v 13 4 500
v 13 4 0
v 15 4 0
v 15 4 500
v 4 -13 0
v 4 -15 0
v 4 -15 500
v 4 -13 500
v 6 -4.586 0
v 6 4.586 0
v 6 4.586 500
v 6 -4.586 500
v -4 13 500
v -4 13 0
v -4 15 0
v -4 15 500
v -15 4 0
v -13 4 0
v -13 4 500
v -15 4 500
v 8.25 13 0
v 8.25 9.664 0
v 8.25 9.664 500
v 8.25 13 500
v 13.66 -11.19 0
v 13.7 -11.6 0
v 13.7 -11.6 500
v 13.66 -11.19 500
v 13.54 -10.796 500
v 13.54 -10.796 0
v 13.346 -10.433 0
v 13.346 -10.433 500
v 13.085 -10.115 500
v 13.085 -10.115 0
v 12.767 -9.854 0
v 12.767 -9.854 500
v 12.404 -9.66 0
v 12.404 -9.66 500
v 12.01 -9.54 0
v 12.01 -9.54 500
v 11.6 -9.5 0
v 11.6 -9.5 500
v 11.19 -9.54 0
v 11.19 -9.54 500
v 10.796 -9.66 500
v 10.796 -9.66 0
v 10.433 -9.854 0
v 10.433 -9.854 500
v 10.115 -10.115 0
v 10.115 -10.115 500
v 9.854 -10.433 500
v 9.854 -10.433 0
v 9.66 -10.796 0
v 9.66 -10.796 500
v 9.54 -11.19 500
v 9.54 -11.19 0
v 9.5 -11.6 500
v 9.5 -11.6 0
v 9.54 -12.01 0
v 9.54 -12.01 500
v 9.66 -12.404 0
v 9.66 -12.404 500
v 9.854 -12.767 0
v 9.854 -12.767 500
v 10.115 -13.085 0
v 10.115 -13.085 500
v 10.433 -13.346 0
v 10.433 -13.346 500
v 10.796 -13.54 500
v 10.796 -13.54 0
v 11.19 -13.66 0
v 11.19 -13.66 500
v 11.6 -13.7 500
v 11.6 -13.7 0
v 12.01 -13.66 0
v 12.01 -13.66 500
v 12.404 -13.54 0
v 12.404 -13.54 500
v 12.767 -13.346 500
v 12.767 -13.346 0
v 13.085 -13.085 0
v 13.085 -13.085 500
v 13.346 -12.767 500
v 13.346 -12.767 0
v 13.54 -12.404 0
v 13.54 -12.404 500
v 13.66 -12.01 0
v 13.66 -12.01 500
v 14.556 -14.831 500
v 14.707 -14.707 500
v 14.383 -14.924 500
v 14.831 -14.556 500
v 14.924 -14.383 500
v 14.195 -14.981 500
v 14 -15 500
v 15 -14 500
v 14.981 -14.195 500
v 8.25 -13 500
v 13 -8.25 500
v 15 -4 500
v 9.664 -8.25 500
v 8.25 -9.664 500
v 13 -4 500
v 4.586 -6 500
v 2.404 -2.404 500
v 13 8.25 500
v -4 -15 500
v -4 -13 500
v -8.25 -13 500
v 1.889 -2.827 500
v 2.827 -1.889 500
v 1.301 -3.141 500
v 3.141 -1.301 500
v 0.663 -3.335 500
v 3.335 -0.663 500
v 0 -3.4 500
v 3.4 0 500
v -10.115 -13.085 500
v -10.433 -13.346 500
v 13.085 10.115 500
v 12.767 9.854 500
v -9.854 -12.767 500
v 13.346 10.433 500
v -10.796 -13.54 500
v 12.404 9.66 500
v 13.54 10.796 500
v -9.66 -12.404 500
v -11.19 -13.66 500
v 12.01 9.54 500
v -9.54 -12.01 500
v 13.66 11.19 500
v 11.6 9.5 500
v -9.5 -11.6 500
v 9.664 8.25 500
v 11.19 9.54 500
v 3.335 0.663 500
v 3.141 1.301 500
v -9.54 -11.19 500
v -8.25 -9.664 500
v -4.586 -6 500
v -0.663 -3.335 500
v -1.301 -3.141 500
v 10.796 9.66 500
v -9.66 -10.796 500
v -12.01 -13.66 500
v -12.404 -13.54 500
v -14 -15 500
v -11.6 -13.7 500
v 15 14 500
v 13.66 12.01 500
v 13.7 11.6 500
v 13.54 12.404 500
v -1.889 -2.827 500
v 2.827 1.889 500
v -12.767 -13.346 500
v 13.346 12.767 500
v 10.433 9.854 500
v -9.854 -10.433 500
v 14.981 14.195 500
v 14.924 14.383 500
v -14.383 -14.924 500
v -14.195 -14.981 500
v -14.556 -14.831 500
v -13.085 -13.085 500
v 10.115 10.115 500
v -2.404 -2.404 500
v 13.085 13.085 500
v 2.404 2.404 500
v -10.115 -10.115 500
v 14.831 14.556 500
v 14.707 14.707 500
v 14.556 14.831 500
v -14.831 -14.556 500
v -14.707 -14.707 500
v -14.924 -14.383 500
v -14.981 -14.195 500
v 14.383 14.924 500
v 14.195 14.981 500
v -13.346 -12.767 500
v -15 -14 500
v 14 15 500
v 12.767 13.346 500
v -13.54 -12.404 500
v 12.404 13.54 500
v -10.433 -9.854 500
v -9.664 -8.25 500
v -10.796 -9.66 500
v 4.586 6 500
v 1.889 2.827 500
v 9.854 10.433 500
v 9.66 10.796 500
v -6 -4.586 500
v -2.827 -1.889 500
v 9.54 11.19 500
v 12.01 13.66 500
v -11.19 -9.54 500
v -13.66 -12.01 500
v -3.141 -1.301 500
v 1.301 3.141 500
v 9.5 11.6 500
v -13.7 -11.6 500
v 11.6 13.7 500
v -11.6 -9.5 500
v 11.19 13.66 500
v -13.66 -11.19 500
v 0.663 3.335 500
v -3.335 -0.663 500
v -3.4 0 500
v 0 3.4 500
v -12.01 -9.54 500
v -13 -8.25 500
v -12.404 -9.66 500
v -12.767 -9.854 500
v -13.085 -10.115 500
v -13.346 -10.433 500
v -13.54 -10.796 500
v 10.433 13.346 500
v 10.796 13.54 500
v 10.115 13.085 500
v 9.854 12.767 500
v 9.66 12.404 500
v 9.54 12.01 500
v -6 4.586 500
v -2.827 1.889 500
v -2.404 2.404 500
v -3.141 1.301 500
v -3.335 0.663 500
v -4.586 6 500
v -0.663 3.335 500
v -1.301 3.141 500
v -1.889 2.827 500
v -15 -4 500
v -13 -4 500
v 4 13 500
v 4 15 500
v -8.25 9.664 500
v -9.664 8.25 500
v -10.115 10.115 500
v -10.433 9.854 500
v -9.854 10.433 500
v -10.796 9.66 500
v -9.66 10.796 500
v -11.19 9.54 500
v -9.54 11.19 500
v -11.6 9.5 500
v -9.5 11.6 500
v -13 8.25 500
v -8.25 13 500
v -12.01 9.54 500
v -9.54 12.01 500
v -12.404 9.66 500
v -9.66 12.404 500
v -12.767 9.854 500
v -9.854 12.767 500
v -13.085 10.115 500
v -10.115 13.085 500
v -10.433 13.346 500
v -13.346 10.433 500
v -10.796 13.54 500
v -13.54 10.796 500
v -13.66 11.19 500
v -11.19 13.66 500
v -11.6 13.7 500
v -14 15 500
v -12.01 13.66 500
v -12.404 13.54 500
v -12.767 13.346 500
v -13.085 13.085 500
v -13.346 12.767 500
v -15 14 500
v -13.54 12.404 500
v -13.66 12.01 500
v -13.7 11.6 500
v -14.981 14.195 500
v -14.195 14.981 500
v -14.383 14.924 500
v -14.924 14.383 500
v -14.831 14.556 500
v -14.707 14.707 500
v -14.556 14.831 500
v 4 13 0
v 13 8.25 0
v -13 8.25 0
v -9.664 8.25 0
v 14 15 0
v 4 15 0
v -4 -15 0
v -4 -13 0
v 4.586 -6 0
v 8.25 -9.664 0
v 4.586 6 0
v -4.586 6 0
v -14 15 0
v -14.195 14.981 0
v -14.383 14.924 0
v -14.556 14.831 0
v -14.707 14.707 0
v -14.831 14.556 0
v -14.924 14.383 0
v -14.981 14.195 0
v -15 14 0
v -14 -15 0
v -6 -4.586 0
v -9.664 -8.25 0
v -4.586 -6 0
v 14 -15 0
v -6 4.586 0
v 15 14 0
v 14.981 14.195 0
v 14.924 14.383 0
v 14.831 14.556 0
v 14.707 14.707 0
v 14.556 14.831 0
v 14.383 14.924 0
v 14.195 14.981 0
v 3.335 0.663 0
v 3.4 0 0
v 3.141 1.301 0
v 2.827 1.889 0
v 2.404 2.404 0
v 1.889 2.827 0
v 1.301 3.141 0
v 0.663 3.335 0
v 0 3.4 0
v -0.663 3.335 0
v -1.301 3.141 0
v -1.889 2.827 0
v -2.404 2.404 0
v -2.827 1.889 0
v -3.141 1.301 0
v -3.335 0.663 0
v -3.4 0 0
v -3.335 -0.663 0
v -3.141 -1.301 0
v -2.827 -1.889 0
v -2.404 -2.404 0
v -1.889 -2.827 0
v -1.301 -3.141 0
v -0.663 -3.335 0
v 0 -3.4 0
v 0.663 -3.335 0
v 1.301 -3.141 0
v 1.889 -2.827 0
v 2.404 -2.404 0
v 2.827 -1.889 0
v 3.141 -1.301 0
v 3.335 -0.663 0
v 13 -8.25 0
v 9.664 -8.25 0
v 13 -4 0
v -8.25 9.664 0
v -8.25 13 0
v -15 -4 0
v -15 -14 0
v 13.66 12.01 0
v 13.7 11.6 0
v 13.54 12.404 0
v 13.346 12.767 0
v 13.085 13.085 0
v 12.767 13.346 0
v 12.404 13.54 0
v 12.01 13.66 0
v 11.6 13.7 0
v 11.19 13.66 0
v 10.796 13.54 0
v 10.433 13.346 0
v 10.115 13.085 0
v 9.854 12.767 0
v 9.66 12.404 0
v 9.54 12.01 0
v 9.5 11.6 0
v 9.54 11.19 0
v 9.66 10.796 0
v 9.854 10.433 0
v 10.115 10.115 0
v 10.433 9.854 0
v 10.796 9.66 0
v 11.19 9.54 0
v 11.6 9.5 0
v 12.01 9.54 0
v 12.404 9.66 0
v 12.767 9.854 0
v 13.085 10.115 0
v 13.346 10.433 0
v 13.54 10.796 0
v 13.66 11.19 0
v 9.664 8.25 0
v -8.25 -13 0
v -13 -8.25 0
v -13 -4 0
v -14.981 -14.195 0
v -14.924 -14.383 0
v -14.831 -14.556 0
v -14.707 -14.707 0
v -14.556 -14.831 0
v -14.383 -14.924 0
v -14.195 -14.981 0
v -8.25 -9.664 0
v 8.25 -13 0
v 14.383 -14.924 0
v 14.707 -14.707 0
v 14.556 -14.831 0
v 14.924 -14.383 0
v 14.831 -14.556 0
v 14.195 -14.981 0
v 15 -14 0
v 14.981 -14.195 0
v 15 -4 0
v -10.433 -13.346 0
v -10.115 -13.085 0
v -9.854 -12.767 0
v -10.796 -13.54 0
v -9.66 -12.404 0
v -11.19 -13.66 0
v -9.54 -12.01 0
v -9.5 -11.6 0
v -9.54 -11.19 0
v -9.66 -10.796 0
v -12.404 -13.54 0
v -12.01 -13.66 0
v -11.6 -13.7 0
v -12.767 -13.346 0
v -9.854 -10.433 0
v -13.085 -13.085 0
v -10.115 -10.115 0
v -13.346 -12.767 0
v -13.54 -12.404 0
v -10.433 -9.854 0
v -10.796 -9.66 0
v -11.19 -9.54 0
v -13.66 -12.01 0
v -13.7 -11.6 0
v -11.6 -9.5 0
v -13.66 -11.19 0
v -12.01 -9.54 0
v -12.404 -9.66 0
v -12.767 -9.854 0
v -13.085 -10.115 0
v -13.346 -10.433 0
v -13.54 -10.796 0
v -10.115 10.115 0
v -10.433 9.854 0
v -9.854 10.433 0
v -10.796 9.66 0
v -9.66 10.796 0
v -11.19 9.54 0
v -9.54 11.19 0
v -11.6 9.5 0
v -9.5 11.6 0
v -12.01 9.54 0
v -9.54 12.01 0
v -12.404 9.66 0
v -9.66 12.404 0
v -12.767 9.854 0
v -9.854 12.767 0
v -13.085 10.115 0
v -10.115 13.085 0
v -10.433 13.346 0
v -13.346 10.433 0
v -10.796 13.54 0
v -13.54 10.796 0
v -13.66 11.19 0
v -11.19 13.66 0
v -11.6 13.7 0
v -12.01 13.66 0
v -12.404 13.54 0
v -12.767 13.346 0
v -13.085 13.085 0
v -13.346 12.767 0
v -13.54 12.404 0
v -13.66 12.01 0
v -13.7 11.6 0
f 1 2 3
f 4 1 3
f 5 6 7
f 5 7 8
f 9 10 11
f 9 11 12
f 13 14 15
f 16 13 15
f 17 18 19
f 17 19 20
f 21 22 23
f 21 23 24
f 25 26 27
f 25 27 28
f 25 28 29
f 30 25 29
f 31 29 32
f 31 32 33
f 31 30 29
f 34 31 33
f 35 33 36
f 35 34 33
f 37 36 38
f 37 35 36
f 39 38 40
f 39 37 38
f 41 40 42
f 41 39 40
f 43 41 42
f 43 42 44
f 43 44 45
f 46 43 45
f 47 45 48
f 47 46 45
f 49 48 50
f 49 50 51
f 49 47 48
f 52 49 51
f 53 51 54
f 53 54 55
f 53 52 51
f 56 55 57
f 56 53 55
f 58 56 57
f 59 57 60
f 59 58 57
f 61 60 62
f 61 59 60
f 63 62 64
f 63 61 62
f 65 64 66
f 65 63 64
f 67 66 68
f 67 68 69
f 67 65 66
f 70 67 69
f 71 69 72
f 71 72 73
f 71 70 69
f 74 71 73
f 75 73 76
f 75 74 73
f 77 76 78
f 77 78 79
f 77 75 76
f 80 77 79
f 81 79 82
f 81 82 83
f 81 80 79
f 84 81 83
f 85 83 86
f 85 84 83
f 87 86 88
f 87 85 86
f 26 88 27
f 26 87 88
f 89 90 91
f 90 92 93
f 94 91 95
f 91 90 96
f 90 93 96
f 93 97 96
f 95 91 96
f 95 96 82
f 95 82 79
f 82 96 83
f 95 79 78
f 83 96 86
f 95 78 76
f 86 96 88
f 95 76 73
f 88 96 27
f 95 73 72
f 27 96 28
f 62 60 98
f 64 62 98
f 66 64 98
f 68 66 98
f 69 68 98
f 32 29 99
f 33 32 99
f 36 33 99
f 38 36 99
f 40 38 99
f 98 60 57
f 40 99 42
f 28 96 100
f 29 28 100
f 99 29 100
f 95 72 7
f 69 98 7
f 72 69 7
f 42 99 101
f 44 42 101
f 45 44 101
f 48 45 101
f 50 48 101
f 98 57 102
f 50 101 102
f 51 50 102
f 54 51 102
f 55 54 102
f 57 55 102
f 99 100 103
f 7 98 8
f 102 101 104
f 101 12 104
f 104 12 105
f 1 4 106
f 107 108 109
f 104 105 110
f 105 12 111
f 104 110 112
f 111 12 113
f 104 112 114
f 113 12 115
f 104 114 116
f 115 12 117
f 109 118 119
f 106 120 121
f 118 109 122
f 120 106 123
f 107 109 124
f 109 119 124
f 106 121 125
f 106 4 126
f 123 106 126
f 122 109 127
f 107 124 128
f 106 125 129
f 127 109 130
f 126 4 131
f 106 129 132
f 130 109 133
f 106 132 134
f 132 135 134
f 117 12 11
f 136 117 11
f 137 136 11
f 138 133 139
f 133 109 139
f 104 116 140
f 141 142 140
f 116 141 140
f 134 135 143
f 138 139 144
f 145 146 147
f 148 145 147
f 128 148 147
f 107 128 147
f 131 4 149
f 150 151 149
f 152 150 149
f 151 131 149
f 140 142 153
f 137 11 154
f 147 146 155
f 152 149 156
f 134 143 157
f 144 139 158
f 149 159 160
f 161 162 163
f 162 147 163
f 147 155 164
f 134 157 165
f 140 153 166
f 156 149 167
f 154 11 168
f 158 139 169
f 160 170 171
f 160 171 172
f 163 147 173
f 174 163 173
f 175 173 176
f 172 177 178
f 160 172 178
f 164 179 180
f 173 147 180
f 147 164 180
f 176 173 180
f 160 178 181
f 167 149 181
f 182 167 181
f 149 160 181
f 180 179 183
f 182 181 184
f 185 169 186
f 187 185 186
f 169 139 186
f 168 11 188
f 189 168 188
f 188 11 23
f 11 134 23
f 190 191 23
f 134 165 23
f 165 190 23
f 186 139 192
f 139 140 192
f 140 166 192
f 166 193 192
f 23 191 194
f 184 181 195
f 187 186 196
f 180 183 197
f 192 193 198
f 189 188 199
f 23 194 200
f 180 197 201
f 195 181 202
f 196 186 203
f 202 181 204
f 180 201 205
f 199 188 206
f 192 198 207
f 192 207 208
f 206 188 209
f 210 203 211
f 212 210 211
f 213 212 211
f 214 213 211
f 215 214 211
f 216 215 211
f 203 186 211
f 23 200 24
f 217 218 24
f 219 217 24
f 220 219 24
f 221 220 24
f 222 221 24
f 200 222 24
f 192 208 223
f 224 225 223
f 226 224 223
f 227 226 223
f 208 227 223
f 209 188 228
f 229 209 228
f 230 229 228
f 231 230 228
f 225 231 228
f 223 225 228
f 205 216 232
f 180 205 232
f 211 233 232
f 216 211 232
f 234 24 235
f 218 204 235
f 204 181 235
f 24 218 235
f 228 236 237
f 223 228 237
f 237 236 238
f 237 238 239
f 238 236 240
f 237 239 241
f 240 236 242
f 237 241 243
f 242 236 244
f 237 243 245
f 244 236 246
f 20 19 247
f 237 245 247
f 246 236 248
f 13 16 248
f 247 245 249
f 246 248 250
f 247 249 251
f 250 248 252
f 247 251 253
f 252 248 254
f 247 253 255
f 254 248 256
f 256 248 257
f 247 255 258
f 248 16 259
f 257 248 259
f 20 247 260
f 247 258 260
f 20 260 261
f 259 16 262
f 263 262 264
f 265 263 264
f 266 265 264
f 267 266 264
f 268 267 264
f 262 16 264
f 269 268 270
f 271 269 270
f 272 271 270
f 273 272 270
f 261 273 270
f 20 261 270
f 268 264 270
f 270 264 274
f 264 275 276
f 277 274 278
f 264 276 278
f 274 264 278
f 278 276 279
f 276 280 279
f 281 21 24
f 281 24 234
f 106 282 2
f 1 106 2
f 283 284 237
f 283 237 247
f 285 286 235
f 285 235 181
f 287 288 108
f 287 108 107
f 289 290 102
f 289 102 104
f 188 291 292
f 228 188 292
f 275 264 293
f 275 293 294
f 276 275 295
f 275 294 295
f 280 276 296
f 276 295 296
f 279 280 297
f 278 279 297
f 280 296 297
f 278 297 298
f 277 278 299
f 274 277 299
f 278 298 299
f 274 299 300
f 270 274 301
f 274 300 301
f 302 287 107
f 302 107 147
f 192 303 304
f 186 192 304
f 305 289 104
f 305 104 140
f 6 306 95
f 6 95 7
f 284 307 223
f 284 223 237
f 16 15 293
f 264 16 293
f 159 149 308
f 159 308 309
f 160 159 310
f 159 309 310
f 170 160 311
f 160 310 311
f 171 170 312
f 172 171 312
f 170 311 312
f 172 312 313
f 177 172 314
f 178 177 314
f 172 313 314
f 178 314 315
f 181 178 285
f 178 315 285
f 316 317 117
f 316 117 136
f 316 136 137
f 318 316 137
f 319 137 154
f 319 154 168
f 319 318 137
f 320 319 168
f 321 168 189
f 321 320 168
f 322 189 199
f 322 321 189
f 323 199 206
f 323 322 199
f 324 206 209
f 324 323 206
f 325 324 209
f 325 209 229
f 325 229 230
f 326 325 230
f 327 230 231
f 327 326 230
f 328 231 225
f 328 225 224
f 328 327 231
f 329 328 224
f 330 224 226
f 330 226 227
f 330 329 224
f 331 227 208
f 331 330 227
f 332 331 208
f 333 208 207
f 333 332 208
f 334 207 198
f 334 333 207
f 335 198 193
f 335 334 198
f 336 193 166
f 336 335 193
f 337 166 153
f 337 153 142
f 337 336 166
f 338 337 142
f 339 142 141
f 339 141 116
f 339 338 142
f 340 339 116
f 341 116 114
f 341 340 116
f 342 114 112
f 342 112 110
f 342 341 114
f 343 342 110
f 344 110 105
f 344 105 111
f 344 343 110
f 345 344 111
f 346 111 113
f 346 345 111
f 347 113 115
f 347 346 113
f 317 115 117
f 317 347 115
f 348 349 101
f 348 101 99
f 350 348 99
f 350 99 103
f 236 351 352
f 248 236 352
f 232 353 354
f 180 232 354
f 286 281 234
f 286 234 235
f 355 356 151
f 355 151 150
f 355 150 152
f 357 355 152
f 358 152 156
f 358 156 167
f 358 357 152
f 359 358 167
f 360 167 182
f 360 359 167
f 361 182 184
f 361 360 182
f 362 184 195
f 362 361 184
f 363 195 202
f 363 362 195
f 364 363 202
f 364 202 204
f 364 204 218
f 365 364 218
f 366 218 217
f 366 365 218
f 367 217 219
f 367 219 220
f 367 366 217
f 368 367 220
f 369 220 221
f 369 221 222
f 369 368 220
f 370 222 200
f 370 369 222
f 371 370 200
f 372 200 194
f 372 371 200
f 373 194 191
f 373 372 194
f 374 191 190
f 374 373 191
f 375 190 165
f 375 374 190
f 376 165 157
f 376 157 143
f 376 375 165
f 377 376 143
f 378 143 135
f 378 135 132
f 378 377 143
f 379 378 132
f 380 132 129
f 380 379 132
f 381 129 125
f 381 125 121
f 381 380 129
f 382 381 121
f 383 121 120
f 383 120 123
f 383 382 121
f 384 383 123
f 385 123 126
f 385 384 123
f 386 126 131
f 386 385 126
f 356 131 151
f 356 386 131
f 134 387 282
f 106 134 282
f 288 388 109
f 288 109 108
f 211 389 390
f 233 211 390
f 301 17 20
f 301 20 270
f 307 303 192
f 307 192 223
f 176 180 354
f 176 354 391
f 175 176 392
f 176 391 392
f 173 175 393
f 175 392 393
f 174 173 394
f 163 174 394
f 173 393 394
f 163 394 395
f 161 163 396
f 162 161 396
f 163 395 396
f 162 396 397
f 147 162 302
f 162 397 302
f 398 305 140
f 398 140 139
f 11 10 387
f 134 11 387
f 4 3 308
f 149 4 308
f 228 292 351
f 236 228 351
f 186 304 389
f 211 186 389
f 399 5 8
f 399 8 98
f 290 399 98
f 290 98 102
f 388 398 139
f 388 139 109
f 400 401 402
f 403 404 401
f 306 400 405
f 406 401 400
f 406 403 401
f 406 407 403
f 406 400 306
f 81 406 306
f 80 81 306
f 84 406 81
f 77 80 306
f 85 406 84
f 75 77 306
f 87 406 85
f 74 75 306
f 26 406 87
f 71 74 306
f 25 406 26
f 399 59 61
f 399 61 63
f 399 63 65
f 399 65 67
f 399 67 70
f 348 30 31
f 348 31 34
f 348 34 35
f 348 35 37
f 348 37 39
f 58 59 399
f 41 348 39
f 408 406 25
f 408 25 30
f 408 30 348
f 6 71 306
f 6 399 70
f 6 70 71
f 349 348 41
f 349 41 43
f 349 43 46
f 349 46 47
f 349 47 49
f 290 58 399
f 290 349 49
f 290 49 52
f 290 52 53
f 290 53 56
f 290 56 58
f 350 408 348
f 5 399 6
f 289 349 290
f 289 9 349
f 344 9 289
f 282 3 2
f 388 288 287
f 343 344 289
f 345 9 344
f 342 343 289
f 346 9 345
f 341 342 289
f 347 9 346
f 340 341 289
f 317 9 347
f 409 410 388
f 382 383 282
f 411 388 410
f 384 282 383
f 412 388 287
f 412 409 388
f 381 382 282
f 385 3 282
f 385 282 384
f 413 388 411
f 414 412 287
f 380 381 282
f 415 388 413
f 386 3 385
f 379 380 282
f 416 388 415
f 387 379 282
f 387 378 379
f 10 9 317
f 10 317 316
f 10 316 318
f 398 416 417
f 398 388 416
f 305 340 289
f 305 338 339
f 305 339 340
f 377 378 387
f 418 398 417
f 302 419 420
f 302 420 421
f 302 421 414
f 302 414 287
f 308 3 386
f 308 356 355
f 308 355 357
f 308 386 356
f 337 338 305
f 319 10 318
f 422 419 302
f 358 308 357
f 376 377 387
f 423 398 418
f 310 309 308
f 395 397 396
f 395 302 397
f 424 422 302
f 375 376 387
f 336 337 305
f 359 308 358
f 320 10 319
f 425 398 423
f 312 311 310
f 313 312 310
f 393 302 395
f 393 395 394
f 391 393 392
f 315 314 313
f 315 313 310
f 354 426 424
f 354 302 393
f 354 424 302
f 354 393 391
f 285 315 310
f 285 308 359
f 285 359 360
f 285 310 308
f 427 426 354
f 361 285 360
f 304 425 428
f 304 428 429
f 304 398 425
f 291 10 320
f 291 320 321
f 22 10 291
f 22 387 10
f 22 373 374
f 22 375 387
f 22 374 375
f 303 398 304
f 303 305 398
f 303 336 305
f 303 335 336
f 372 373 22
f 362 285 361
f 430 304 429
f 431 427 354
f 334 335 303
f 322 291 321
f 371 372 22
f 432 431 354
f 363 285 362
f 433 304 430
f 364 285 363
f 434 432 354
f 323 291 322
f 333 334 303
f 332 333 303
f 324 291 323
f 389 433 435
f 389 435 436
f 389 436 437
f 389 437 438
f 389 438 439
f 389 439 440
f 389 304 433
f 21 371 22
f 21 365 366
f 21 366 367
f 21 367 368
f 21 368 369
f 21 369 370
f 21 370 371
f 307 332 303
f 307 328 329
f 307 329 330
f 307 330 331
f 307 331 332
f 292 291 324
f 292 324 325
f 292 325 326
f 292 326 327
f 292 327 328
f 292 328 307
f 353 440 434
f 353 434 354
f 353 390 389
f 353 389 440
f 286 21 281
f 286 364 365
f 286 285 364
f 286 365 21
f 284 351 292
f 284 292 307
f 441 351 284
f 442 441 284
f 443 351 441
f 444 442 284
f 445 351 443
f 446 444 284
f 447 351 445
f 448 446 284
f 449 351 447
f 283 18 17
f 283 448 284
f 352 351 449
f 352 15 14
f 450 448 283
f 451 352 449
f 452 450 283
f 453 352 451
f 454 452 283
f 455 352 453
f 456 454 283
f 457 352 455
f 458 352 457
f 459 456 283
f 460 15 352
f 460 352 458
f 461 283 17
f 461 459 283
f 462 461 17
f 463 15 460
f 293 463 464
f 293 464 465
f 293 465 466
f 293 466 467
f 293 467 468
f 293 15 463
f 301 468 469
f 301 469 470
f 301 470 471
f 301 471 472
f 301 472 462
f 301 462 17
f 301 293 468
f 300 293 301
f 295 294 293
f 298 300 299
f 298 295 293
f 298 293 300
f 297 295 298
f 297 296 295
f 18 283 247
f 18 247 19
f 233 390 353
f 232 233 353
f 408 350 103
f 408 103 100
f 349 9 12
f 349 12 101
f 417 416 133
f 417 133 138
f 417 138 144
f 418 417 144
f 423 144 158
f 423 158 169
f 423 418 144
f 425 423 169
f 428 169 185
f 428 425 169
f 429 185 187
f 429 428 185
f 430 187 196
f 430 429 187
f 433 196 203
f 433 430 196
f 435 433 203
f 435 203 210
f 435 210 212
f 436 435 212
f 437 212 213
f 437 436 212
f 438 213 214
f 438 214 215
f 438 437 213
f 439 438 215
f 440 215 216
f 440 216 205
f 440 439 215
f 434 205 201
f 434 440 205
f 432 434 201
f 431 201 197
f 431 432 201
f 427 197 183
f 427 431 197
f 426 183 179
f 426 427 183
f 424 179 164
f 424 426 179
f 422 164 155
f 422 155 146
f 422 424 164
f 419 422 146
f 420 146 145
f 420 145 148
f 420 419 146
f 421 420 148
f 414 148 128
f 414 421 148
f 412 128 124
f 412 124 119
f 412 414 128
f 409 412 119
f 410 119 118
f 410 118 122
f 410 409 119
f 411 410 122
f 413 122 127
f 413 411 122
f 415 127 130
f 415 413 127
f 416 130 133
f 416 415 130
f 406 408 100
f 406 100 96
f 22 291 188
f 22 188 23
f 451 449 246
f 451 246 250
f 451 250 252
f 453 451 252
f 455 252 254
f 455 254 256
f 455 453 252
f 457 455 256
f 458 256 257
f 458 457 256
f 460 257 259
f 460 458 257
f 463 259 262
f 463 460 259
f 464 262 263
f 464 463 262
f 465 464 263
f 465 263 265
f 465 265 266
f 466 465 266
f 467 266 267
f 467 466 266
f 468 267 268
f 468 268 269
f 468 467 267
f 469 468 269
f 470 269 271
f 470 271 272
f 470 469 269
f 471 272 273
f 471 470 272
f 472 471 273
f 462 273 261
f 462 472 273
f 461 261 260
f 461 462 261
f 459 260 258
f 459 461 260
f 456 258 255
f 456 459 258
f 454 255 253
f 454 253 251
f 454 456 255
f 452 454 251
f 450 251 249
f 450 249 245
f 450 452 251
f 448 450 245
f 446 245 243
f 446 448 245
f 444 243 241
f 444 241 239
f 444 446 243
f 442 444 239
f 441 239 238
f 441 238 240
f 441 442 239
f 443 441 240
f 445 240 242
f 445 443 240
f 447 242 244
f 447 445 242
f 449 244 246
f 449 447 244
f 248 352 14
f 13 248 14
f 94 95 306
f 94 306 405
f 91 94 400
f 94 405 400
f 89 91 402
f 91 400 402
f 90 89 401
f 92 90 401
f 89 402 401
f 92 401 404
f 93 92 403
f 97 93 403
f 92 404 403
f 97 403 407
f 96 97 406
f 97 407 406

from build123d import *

# Parameters (mm, degrees)
SKETCH_R   = 2.1
SKETCH_R_2 = 3.4
PAD_DEPTH  = 500


with BuildPart() as part:
    # Sketch → Pad (new body)
    with BuildSketch(Plane.XY):
        with BuildLine():
            Line((-6, -4.585786), (-6, 4.585786))
            Line((-6, 4.585786), (-9.664214, 8.25))
            Line((-9.664214, 8.25), (-13, 8.25))
            Line((-13, 8.25), (-13, 4))
            Line((-13, 4), (-15, 4))
            Line((-15, 4), (-15, 14))
            ThreePointArc((-14, 15), (-14.707107, 14.707107), (-15, 14))
            Line((-4, 15), (-14, 15))
            Line((-4, 13), (-4, 15))
            Line((-8.25, 13), (-4, 13))
            Line((-8.25, 9.664214), (-8.25, 13))
            Line((-4.585786, 6), (-8.25, 9.664214))
            Line((4.585786, 6), (-4.585786, 6))
            Line((4.585786, 6), (8.25, 9.664214))
            Line((8.25, 9.664214), (8.25, 13))
            Line((8.25, 13), (4, 13))
            Line((4, 13), (4, 15))
            Line((4, 15), (14, 15))
            ThreePointArc((15, 14), (14.707107, 14.707107), (14, 15))
            Line((15, 4), (15, 14))
            Line((13, 4), (15, 4))
            Line((13, 8.25), (13, 4))
            Line((9.664214, 8.25), (13, 8.25))
            Line((6, 4.585786), (9.664214, 8.25))
            Line((6, 4.585786), (6, -4.585786))
            Line((6, -4.585786), (9.664214, -8.25))
            Line((9.664214, -8.25), (13, -8.25))
            Line((13, -8.25), (13, -4))
            Line((13, -4), (15, -4))
            Line((15, -4), (15, -14))
            ThreePointArc((14, -15), (14.707107, -14.707107), (15, -14))
            Line((14, -15), (4, -15))
            Line((4, -15), (4, -13))
            Line((4, -13), (8.25, -13))
            Line((8.25, -13), (8.25, -9.664214))
            Line((8.25, -9.664214), (4.585786, -6))
            Line((4.585786, -6), (-4.585786, -6))
            Line((-4.585786, -6), (-8.25, -9.664214))
            Line((-8.25, -9.664214), (-8.25, -13))
            Line((-8.25, -13), (-4, -13))
            Line((-4, -13), (-4, -15))
            Line((-4, -15), (-14, -15))
            ThreePointArc((-15, -14), (-14.707107, -14.707107), (-14, -15))
            Line((-15, -4), (-15, -14))
            Line((-13, -4), (-15, -4))
            Line((-13, -8.25), (-13, -4))
            Line((-9.664214, -8.25), (-13, -8.25))
            Line((-6, -4.585786), (-9.664214, -8.25))
        make_face()
        with Locations((-11.6, 11.6)):
            Circle(SKETCH_R, mode=Mode.SUBTRACT)
        Circle(SKETCH_R_2, mode=Mode.SUBTRACT)
        with Locations((11.6, 11.6)):
            Circle(SKETCH_R, mode=Mode.SUBTRACT)
        with Locations((-11.6, -11.6)):
            Circle(SKETCH_R, mode=Mode.SUBTRACT)
        with Locations((11.6, -11.6)):
            Circle(SKETCH_R, mode=Mode.SUBTRACT)
    extrude(amount=PAD_DEPTH)


solid = part.part
